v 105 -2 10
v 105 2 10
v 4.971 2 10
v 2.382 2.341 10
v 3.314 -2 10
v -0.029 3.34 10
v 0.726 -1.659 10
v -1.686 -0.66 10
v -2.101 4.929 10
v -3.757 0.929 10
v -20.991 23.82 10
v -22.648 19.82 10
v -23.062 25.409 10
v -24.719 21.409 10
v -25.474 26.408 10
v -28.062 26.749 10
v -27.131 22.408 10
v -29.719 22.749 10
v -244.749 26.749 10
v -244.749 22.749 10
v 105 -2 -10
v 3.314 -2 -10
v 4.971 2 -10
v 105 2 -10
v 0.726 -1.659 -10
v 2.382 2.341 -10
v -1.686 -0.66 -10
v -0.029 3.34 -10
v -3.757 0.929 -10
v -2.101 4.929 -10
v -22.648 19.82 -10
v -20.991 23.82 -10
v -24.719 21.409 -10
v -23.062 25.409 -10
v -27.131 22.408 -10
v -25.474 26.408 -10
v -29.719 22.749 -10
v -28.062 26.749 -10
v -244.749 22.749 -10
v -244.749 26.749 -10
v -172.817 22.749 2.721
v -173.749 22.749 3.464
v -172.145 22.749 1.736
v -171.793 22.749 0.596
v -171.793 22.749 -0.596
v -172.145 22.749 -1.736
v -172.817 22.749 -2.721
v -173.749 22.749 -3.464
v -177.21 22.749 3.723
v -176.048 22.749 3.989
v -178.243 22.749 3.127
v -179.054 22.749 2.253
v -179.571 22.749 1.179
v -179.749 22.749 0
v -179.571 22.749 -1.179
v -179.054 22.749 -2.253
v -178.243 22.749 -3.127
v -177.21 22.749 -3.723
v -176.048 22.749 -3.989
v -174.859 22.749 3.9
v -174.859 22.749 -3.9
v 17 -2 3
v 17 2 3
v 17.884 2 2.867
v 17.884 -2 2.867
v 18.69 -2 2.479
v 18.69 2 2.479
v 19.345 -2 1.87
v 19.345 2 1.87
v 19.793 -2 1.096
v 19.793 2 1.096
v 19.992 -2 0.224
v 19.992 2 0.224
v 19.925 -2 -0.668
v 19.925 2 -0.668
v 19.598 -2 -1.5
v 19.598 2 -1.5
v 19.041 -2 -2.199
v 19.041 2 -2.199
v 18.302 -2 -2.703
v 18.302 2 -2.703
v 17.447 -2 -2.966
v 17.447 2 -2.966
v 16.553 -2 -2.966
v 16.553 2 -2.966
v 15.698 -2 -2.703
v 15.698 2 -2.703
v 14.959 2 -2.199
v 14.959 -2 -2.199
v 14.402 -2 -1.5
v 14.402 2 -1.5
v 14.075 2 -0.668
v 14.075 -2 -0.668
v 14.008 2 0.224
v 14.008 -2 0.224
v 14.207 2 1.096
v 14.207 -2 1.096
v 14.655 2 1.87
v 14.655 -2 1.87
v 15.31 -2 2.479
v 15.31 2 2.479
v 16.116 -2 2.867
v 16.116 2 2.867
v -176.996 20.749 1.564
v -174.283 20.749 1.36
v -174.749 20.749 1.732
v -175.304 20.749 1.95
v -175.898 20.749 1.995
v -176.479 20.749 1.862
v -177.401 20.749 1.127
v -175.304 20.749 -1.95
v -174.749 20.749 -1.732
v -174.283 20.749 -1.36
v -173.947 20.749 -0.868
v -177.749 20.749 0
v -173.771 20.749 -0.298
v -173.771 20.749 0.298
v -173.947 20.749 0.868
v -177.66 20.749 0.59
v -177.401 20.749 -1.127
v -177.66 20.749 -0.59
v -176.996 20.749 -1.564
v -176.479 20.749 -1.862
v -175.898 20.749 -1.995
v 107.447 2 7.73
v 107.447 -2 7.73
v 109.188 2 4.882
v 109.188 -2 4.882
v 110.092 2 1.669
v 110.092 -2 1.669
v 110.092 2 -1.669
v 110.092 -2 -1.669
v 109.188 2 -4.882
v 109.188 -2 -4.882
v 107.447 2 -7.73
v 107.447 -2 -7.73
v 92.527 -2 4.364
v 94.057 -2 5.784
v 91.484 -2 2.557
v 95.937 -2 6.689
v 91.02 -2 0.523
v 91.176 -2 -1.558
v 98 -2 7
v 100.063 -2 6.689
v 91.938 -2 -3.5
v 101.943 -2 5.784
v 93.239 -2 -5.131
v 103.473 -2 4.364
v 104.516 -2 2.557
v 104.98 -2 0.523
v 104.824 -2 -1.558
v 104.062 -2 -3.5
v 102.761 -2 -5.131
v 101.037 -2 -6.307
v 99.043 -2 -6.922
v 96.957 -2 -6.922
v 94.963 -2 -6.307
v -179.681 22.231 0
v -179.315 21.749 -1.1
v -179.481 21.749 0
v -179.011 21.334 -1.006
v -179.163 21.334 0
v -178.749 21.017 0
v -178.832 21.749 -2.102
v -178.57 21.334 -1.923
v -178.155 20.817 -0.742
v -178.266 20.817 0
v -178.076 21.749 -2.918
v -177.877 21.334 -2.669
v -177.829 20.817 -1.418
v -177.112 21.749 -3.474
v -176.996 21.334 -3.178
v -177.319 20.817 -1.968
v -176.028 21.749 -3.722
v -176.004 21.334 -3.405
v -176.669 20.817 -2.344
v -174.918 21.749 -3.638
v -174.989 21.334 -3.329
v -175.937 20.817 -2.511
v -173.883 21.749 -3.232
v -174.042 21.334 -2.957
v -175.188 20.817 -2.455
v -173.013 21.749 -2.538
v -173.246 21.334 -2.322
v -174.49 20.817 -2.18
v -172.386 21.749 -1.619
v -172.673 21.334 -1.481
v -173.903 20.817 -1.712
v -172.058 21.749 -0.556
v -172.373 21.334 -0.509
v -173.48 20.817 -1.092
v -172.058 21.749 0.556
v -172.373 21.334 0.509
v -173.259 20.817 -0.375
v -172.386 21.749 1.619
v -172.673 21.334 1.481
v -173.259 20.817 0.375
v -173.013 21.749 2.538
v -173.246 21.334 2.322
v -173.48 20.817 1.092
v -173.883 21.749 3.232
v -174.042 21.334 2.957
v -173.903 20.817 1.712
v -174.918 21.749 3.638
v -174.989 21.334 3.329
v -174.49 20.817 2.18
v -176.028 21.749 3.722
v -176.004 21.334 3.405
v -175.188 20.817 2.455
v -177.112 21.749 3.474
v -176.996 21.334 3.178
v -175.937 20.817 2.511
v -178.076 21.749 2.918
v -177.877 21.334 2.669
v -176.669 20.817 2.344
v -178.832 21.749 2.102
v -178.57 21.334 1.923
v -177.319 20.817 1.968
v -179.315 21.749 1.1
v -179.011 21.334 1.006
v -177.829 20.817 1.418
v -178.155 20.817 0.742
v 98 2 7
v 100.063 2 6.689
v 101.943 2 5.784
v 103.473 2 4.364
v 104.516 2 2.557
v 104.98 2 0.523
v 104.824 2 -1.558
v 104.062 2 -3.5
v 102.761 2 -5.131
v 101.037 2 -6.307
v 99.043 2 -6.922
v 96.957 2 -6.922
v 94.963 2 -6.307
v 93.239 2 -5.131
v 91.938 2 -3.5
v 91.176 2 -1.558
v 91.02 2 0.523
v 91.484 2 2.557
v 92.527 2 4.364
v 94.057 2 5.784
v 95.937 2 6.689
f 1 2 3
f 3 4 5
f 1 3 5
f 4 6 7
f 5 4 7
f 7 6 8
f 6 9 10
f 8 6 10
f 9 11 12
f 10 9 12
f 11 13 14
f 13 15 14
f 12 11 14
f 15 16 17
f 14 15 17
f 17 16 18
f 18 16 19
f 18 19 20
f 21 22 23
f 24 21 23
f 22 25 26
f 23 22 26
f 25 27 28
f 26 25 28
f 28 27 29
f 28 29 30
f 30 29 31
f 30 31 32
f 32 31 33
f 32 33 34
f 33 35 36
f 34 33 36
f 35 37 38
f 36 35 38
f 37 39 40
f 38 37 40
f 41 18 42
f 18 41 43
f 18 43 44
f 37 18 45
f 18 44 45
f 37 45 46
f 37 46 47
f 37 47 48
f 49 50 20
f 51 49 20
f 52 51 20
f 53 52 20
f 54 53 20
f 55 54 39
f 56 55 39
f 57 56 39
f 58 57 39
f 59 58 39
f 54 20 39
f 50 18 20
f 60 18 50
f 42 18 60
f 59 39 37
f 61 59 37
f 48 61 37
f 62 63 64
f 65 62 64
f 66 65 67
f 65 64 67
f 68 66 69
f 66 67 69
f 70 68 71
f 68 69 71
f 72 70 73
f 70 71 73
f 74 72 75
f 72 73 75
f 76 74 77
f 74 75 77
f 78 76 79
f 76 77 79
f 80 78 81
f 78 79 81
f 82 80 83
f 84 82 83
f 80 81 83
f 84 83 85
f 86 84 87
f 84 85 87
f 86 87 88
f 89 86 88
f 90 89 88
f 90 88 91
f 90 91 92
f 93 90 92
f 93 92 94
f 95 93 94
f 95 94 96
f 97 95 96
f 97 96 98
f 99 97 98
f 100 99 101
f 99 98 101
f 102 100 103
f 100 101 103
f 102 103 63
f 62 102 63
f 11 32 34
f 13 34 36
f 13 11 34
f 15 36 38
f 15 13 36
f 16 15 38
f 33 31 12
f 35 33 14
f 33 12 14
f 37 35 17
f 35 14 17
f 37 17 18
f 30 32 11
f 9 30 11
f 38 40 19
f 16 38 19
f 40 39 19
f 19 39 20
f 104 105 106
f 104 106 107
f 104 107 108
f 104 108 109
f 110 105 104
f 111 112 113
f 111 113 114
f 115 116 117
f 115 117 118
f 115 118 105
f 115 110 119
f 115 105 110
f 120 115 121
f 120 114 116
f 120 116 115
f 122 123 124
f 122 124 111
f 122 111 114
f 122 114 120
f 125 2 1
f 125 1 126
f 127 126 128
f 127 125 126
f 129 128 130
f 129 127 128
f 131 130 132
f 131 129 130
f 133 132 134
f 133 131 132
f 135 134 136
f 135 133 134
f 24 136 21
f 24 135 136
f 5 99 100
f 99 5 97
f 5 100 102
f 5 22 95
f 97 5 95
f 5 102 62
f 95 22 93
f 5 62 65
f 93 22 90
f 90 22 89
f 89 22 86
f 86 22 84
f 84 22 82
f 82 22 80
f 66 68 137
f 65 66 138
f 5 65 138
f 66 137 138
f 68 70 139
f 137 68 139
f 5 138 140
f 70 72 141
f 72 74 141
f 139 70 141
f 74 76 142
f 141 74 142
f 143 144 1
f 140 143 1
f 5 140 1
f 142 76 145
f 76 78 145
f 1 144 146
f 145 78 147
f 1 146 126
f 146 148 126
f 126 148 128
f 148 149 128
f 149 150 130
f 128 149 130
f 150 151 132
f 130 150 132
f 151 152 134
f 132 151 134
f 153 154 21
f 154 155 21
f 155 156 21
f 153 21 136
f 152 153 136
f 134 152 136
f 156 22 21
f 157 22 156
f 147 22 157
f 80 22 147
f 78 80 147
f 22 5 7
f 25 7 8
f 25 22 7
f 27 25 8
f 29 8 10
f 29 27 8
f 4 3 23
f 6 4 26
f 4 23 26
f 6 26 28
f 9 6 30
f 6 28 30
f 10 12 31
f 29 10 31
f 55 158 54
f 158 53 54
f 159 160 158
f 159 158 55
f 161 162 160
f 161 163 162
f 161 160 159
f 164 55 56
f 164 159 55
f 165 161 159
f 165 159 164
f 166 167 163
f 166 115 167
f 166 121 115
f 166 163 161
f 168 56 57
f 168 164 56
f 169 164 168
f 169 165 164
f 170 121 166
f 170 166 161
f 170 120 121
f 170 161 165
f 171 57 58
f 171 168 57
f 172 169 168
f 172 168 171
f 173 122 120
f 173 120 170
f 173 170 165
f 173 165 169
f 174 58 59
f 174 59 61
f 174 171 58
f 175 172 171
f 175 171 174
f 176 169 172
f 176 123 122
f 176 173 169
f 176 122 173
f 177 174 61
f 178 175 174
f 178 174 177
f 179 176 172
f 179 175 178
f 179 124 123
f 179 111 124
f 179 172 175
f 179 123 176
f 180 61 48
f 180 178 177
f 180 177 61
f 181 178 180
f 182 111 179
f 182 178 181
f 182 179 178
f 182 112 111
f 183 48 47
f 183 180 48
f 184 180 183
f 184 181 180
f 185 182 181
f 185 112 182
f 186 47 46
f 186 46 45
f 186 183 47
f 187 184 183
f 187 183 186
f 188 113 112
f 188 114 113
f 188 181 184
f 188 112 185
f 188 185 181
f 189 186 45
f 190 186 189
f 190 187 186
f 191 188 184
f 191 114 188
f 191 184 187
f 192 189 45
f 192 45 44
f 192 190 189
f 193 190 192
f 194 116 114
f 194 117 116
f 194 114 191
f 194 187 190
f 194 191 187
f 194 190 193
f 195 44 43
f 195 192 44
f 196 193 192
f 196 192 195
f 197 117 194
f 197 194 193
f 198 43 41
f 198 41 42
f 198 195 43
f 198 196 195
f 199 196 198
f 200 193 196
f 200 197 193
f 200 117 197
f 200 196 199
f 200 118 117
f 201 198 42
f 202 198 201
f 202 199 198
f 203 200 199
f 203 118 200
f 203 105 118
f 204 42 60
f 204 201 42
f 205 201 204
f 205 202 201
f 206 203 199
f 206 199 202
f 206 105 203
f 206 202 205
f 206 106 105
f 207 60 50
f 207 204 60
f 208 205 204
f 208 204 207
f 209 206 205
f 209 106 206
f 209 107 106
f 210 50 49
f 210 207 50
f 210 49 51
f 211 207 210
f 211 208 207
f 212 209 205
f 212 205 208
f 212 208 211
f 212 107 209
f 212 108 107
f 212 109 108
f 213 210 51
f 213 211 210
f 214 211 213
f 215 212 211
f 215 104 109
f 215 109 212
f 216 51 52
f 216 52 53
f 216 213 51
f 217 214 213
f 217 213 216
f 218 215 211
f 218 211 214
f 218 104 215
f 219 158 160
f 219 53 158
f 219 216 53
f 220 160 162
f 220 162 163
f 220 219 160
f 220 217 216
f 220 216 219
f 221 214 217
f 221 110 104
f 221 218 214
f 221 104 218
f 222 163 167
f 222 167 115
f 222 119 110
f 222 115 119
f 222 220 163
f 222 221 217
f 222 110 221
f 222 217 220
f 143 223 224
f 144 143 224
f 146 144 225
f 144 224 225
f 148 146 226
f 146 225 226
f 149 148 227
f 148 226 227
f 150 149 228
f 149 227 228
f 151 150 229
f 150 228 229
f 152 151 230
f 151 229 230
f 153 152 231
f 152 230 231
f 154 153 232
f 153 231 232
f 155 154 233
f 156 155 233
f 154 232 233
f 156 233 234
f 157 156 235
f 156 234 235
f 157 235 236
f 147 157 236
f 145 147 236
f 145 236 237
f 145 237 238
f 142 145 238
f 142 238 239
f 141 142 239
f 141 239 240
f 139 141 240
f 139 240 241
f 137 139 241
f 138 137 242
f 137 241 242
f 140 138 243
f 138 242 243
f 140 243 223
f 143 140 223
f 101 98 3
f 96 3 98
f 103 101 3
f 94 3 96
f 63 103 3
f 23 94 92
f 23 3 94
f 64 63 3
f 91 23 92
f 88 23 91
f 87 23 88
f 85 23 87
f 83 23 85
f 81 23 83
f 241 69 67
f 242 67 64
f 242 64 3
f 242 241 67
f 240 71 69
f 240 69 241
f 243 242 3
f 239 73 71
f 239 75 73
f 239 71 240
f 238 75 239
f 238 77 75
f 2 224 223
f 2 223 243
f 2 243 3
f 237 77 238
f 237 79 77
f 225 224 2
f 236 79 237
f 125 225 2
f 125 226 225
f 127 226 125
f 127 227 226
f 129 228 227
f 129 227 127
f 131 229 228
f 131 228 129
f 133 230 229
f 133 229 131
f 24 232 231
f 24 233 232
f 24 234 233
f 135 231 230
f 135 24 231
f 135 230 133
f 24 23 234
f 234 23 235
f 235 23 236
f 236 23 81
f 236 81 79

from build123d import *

# Parameters (mm, degrees)
SKETCH3_W           = 20
SKETCH3_H           = 4
FILLET1_R           = 10
BOSS_EXTRUDE1_DEPTH = 4
SKETCH4_4_R         = 7
SKETCH4_4_R_2       = 3
CUT_EXTRUDE6_DEPTH  = 4
SKETCH5_R           = 4
BOSS_EXTRUDE2_DEPTH = 2
FILLET4_R           = 2


with BuildPart() as part:
    # Sweep1: sweep along a path in Sketch2
    with BuildLine(Plane.XY) as sweep1_path:
        Line((105, 0), (0, 0))
        Line((0, 0), (-24.748737342, 24.748737342))
        Line((-24.748737342, 24.748737342), (-159.748737342, 24.748737342))
        Line((-159.748737342, 24.748737342), (-244.748737342, 24.748737342))
    # Sketch3 → Sweep1 (sweep)
    with BuildSketch(Plane(origin=(105, 0, 0), x_dir=(0, 0, -1), z_dir=(1, 0, 0))):
        Rectangle(SKETCH3_W, SKETCH3_H)
    sweep(path=sweep1_path.line, transition=Transition.RIGHT)

    # Fillet1
    fillet1_edges = [part.edges().sort_by_distance(p)[0] for p in [
        (-0.828427125, -2, 0),
        (0.828427125, 2, 0),
        (-23.920310217, 26.748737342, 0),
        (-25.577164466, 22.748737342, 0),
    ]]
    fillet(fillet1_edges, radius=FILLET1_R)

    # Sketch4 → Boss-Extrude1 (add)
    with BuildSketch(Plane(origin=(0, 2, 0), x_dir=(1, 0, 0), z_dir=(0, 1, 0))):
        with BuildLine():
            ThreePointArc((105, -10), (110.206555616, 0), (105, 10))
            Line((105, 10), (105, 0))
            Line((105, 0), (105, -10))
        make_face()
    extrude(amount=-BOSS_EXTRUDE1_DEPTH)

    # Sketch4<4> → Cut-Extrude6 (cut)
    with BuildSketch(Plane(origin=(0, 2, 0), x_dir=(1, 0, 0), z_dir=(0, 1, 0))):
        with Locations(Location((98, 0, 0), (0, 0, 270))):
            Circle(SKETCH4_4_R)
        with Locations(Location((17, 0, 0), (0, 0, 270))):
            Circle(SKETCH4_4_R_2)
    extrude(amount=-CUT_EXTRUDE6_DEPTH, mode=Mode.SUBTRACT)

    # Sketch5 → Boss-Extrude2 (add)
    with BuildSketch(Plane.XZ.offset(-22.748737342)):
        with Locations(Location((-175.748737342, 0, 0), (0, 0, 180))):
            Circle(SKETCH5_R)
    extrude(amount=BOSS_EXTRUDE2_DEPTH)

    # Fillet4
    fillet4_edges = [part.edges().sort_by_distance(p)[0] for p in [
        (-171.748737342, 20.748737342, 0),
    ]]
    fillet(fillet4_edges, radius=FILLET4_R - 0.0001)  # a hair under: the kernel refuses the full size


solid = part.part
